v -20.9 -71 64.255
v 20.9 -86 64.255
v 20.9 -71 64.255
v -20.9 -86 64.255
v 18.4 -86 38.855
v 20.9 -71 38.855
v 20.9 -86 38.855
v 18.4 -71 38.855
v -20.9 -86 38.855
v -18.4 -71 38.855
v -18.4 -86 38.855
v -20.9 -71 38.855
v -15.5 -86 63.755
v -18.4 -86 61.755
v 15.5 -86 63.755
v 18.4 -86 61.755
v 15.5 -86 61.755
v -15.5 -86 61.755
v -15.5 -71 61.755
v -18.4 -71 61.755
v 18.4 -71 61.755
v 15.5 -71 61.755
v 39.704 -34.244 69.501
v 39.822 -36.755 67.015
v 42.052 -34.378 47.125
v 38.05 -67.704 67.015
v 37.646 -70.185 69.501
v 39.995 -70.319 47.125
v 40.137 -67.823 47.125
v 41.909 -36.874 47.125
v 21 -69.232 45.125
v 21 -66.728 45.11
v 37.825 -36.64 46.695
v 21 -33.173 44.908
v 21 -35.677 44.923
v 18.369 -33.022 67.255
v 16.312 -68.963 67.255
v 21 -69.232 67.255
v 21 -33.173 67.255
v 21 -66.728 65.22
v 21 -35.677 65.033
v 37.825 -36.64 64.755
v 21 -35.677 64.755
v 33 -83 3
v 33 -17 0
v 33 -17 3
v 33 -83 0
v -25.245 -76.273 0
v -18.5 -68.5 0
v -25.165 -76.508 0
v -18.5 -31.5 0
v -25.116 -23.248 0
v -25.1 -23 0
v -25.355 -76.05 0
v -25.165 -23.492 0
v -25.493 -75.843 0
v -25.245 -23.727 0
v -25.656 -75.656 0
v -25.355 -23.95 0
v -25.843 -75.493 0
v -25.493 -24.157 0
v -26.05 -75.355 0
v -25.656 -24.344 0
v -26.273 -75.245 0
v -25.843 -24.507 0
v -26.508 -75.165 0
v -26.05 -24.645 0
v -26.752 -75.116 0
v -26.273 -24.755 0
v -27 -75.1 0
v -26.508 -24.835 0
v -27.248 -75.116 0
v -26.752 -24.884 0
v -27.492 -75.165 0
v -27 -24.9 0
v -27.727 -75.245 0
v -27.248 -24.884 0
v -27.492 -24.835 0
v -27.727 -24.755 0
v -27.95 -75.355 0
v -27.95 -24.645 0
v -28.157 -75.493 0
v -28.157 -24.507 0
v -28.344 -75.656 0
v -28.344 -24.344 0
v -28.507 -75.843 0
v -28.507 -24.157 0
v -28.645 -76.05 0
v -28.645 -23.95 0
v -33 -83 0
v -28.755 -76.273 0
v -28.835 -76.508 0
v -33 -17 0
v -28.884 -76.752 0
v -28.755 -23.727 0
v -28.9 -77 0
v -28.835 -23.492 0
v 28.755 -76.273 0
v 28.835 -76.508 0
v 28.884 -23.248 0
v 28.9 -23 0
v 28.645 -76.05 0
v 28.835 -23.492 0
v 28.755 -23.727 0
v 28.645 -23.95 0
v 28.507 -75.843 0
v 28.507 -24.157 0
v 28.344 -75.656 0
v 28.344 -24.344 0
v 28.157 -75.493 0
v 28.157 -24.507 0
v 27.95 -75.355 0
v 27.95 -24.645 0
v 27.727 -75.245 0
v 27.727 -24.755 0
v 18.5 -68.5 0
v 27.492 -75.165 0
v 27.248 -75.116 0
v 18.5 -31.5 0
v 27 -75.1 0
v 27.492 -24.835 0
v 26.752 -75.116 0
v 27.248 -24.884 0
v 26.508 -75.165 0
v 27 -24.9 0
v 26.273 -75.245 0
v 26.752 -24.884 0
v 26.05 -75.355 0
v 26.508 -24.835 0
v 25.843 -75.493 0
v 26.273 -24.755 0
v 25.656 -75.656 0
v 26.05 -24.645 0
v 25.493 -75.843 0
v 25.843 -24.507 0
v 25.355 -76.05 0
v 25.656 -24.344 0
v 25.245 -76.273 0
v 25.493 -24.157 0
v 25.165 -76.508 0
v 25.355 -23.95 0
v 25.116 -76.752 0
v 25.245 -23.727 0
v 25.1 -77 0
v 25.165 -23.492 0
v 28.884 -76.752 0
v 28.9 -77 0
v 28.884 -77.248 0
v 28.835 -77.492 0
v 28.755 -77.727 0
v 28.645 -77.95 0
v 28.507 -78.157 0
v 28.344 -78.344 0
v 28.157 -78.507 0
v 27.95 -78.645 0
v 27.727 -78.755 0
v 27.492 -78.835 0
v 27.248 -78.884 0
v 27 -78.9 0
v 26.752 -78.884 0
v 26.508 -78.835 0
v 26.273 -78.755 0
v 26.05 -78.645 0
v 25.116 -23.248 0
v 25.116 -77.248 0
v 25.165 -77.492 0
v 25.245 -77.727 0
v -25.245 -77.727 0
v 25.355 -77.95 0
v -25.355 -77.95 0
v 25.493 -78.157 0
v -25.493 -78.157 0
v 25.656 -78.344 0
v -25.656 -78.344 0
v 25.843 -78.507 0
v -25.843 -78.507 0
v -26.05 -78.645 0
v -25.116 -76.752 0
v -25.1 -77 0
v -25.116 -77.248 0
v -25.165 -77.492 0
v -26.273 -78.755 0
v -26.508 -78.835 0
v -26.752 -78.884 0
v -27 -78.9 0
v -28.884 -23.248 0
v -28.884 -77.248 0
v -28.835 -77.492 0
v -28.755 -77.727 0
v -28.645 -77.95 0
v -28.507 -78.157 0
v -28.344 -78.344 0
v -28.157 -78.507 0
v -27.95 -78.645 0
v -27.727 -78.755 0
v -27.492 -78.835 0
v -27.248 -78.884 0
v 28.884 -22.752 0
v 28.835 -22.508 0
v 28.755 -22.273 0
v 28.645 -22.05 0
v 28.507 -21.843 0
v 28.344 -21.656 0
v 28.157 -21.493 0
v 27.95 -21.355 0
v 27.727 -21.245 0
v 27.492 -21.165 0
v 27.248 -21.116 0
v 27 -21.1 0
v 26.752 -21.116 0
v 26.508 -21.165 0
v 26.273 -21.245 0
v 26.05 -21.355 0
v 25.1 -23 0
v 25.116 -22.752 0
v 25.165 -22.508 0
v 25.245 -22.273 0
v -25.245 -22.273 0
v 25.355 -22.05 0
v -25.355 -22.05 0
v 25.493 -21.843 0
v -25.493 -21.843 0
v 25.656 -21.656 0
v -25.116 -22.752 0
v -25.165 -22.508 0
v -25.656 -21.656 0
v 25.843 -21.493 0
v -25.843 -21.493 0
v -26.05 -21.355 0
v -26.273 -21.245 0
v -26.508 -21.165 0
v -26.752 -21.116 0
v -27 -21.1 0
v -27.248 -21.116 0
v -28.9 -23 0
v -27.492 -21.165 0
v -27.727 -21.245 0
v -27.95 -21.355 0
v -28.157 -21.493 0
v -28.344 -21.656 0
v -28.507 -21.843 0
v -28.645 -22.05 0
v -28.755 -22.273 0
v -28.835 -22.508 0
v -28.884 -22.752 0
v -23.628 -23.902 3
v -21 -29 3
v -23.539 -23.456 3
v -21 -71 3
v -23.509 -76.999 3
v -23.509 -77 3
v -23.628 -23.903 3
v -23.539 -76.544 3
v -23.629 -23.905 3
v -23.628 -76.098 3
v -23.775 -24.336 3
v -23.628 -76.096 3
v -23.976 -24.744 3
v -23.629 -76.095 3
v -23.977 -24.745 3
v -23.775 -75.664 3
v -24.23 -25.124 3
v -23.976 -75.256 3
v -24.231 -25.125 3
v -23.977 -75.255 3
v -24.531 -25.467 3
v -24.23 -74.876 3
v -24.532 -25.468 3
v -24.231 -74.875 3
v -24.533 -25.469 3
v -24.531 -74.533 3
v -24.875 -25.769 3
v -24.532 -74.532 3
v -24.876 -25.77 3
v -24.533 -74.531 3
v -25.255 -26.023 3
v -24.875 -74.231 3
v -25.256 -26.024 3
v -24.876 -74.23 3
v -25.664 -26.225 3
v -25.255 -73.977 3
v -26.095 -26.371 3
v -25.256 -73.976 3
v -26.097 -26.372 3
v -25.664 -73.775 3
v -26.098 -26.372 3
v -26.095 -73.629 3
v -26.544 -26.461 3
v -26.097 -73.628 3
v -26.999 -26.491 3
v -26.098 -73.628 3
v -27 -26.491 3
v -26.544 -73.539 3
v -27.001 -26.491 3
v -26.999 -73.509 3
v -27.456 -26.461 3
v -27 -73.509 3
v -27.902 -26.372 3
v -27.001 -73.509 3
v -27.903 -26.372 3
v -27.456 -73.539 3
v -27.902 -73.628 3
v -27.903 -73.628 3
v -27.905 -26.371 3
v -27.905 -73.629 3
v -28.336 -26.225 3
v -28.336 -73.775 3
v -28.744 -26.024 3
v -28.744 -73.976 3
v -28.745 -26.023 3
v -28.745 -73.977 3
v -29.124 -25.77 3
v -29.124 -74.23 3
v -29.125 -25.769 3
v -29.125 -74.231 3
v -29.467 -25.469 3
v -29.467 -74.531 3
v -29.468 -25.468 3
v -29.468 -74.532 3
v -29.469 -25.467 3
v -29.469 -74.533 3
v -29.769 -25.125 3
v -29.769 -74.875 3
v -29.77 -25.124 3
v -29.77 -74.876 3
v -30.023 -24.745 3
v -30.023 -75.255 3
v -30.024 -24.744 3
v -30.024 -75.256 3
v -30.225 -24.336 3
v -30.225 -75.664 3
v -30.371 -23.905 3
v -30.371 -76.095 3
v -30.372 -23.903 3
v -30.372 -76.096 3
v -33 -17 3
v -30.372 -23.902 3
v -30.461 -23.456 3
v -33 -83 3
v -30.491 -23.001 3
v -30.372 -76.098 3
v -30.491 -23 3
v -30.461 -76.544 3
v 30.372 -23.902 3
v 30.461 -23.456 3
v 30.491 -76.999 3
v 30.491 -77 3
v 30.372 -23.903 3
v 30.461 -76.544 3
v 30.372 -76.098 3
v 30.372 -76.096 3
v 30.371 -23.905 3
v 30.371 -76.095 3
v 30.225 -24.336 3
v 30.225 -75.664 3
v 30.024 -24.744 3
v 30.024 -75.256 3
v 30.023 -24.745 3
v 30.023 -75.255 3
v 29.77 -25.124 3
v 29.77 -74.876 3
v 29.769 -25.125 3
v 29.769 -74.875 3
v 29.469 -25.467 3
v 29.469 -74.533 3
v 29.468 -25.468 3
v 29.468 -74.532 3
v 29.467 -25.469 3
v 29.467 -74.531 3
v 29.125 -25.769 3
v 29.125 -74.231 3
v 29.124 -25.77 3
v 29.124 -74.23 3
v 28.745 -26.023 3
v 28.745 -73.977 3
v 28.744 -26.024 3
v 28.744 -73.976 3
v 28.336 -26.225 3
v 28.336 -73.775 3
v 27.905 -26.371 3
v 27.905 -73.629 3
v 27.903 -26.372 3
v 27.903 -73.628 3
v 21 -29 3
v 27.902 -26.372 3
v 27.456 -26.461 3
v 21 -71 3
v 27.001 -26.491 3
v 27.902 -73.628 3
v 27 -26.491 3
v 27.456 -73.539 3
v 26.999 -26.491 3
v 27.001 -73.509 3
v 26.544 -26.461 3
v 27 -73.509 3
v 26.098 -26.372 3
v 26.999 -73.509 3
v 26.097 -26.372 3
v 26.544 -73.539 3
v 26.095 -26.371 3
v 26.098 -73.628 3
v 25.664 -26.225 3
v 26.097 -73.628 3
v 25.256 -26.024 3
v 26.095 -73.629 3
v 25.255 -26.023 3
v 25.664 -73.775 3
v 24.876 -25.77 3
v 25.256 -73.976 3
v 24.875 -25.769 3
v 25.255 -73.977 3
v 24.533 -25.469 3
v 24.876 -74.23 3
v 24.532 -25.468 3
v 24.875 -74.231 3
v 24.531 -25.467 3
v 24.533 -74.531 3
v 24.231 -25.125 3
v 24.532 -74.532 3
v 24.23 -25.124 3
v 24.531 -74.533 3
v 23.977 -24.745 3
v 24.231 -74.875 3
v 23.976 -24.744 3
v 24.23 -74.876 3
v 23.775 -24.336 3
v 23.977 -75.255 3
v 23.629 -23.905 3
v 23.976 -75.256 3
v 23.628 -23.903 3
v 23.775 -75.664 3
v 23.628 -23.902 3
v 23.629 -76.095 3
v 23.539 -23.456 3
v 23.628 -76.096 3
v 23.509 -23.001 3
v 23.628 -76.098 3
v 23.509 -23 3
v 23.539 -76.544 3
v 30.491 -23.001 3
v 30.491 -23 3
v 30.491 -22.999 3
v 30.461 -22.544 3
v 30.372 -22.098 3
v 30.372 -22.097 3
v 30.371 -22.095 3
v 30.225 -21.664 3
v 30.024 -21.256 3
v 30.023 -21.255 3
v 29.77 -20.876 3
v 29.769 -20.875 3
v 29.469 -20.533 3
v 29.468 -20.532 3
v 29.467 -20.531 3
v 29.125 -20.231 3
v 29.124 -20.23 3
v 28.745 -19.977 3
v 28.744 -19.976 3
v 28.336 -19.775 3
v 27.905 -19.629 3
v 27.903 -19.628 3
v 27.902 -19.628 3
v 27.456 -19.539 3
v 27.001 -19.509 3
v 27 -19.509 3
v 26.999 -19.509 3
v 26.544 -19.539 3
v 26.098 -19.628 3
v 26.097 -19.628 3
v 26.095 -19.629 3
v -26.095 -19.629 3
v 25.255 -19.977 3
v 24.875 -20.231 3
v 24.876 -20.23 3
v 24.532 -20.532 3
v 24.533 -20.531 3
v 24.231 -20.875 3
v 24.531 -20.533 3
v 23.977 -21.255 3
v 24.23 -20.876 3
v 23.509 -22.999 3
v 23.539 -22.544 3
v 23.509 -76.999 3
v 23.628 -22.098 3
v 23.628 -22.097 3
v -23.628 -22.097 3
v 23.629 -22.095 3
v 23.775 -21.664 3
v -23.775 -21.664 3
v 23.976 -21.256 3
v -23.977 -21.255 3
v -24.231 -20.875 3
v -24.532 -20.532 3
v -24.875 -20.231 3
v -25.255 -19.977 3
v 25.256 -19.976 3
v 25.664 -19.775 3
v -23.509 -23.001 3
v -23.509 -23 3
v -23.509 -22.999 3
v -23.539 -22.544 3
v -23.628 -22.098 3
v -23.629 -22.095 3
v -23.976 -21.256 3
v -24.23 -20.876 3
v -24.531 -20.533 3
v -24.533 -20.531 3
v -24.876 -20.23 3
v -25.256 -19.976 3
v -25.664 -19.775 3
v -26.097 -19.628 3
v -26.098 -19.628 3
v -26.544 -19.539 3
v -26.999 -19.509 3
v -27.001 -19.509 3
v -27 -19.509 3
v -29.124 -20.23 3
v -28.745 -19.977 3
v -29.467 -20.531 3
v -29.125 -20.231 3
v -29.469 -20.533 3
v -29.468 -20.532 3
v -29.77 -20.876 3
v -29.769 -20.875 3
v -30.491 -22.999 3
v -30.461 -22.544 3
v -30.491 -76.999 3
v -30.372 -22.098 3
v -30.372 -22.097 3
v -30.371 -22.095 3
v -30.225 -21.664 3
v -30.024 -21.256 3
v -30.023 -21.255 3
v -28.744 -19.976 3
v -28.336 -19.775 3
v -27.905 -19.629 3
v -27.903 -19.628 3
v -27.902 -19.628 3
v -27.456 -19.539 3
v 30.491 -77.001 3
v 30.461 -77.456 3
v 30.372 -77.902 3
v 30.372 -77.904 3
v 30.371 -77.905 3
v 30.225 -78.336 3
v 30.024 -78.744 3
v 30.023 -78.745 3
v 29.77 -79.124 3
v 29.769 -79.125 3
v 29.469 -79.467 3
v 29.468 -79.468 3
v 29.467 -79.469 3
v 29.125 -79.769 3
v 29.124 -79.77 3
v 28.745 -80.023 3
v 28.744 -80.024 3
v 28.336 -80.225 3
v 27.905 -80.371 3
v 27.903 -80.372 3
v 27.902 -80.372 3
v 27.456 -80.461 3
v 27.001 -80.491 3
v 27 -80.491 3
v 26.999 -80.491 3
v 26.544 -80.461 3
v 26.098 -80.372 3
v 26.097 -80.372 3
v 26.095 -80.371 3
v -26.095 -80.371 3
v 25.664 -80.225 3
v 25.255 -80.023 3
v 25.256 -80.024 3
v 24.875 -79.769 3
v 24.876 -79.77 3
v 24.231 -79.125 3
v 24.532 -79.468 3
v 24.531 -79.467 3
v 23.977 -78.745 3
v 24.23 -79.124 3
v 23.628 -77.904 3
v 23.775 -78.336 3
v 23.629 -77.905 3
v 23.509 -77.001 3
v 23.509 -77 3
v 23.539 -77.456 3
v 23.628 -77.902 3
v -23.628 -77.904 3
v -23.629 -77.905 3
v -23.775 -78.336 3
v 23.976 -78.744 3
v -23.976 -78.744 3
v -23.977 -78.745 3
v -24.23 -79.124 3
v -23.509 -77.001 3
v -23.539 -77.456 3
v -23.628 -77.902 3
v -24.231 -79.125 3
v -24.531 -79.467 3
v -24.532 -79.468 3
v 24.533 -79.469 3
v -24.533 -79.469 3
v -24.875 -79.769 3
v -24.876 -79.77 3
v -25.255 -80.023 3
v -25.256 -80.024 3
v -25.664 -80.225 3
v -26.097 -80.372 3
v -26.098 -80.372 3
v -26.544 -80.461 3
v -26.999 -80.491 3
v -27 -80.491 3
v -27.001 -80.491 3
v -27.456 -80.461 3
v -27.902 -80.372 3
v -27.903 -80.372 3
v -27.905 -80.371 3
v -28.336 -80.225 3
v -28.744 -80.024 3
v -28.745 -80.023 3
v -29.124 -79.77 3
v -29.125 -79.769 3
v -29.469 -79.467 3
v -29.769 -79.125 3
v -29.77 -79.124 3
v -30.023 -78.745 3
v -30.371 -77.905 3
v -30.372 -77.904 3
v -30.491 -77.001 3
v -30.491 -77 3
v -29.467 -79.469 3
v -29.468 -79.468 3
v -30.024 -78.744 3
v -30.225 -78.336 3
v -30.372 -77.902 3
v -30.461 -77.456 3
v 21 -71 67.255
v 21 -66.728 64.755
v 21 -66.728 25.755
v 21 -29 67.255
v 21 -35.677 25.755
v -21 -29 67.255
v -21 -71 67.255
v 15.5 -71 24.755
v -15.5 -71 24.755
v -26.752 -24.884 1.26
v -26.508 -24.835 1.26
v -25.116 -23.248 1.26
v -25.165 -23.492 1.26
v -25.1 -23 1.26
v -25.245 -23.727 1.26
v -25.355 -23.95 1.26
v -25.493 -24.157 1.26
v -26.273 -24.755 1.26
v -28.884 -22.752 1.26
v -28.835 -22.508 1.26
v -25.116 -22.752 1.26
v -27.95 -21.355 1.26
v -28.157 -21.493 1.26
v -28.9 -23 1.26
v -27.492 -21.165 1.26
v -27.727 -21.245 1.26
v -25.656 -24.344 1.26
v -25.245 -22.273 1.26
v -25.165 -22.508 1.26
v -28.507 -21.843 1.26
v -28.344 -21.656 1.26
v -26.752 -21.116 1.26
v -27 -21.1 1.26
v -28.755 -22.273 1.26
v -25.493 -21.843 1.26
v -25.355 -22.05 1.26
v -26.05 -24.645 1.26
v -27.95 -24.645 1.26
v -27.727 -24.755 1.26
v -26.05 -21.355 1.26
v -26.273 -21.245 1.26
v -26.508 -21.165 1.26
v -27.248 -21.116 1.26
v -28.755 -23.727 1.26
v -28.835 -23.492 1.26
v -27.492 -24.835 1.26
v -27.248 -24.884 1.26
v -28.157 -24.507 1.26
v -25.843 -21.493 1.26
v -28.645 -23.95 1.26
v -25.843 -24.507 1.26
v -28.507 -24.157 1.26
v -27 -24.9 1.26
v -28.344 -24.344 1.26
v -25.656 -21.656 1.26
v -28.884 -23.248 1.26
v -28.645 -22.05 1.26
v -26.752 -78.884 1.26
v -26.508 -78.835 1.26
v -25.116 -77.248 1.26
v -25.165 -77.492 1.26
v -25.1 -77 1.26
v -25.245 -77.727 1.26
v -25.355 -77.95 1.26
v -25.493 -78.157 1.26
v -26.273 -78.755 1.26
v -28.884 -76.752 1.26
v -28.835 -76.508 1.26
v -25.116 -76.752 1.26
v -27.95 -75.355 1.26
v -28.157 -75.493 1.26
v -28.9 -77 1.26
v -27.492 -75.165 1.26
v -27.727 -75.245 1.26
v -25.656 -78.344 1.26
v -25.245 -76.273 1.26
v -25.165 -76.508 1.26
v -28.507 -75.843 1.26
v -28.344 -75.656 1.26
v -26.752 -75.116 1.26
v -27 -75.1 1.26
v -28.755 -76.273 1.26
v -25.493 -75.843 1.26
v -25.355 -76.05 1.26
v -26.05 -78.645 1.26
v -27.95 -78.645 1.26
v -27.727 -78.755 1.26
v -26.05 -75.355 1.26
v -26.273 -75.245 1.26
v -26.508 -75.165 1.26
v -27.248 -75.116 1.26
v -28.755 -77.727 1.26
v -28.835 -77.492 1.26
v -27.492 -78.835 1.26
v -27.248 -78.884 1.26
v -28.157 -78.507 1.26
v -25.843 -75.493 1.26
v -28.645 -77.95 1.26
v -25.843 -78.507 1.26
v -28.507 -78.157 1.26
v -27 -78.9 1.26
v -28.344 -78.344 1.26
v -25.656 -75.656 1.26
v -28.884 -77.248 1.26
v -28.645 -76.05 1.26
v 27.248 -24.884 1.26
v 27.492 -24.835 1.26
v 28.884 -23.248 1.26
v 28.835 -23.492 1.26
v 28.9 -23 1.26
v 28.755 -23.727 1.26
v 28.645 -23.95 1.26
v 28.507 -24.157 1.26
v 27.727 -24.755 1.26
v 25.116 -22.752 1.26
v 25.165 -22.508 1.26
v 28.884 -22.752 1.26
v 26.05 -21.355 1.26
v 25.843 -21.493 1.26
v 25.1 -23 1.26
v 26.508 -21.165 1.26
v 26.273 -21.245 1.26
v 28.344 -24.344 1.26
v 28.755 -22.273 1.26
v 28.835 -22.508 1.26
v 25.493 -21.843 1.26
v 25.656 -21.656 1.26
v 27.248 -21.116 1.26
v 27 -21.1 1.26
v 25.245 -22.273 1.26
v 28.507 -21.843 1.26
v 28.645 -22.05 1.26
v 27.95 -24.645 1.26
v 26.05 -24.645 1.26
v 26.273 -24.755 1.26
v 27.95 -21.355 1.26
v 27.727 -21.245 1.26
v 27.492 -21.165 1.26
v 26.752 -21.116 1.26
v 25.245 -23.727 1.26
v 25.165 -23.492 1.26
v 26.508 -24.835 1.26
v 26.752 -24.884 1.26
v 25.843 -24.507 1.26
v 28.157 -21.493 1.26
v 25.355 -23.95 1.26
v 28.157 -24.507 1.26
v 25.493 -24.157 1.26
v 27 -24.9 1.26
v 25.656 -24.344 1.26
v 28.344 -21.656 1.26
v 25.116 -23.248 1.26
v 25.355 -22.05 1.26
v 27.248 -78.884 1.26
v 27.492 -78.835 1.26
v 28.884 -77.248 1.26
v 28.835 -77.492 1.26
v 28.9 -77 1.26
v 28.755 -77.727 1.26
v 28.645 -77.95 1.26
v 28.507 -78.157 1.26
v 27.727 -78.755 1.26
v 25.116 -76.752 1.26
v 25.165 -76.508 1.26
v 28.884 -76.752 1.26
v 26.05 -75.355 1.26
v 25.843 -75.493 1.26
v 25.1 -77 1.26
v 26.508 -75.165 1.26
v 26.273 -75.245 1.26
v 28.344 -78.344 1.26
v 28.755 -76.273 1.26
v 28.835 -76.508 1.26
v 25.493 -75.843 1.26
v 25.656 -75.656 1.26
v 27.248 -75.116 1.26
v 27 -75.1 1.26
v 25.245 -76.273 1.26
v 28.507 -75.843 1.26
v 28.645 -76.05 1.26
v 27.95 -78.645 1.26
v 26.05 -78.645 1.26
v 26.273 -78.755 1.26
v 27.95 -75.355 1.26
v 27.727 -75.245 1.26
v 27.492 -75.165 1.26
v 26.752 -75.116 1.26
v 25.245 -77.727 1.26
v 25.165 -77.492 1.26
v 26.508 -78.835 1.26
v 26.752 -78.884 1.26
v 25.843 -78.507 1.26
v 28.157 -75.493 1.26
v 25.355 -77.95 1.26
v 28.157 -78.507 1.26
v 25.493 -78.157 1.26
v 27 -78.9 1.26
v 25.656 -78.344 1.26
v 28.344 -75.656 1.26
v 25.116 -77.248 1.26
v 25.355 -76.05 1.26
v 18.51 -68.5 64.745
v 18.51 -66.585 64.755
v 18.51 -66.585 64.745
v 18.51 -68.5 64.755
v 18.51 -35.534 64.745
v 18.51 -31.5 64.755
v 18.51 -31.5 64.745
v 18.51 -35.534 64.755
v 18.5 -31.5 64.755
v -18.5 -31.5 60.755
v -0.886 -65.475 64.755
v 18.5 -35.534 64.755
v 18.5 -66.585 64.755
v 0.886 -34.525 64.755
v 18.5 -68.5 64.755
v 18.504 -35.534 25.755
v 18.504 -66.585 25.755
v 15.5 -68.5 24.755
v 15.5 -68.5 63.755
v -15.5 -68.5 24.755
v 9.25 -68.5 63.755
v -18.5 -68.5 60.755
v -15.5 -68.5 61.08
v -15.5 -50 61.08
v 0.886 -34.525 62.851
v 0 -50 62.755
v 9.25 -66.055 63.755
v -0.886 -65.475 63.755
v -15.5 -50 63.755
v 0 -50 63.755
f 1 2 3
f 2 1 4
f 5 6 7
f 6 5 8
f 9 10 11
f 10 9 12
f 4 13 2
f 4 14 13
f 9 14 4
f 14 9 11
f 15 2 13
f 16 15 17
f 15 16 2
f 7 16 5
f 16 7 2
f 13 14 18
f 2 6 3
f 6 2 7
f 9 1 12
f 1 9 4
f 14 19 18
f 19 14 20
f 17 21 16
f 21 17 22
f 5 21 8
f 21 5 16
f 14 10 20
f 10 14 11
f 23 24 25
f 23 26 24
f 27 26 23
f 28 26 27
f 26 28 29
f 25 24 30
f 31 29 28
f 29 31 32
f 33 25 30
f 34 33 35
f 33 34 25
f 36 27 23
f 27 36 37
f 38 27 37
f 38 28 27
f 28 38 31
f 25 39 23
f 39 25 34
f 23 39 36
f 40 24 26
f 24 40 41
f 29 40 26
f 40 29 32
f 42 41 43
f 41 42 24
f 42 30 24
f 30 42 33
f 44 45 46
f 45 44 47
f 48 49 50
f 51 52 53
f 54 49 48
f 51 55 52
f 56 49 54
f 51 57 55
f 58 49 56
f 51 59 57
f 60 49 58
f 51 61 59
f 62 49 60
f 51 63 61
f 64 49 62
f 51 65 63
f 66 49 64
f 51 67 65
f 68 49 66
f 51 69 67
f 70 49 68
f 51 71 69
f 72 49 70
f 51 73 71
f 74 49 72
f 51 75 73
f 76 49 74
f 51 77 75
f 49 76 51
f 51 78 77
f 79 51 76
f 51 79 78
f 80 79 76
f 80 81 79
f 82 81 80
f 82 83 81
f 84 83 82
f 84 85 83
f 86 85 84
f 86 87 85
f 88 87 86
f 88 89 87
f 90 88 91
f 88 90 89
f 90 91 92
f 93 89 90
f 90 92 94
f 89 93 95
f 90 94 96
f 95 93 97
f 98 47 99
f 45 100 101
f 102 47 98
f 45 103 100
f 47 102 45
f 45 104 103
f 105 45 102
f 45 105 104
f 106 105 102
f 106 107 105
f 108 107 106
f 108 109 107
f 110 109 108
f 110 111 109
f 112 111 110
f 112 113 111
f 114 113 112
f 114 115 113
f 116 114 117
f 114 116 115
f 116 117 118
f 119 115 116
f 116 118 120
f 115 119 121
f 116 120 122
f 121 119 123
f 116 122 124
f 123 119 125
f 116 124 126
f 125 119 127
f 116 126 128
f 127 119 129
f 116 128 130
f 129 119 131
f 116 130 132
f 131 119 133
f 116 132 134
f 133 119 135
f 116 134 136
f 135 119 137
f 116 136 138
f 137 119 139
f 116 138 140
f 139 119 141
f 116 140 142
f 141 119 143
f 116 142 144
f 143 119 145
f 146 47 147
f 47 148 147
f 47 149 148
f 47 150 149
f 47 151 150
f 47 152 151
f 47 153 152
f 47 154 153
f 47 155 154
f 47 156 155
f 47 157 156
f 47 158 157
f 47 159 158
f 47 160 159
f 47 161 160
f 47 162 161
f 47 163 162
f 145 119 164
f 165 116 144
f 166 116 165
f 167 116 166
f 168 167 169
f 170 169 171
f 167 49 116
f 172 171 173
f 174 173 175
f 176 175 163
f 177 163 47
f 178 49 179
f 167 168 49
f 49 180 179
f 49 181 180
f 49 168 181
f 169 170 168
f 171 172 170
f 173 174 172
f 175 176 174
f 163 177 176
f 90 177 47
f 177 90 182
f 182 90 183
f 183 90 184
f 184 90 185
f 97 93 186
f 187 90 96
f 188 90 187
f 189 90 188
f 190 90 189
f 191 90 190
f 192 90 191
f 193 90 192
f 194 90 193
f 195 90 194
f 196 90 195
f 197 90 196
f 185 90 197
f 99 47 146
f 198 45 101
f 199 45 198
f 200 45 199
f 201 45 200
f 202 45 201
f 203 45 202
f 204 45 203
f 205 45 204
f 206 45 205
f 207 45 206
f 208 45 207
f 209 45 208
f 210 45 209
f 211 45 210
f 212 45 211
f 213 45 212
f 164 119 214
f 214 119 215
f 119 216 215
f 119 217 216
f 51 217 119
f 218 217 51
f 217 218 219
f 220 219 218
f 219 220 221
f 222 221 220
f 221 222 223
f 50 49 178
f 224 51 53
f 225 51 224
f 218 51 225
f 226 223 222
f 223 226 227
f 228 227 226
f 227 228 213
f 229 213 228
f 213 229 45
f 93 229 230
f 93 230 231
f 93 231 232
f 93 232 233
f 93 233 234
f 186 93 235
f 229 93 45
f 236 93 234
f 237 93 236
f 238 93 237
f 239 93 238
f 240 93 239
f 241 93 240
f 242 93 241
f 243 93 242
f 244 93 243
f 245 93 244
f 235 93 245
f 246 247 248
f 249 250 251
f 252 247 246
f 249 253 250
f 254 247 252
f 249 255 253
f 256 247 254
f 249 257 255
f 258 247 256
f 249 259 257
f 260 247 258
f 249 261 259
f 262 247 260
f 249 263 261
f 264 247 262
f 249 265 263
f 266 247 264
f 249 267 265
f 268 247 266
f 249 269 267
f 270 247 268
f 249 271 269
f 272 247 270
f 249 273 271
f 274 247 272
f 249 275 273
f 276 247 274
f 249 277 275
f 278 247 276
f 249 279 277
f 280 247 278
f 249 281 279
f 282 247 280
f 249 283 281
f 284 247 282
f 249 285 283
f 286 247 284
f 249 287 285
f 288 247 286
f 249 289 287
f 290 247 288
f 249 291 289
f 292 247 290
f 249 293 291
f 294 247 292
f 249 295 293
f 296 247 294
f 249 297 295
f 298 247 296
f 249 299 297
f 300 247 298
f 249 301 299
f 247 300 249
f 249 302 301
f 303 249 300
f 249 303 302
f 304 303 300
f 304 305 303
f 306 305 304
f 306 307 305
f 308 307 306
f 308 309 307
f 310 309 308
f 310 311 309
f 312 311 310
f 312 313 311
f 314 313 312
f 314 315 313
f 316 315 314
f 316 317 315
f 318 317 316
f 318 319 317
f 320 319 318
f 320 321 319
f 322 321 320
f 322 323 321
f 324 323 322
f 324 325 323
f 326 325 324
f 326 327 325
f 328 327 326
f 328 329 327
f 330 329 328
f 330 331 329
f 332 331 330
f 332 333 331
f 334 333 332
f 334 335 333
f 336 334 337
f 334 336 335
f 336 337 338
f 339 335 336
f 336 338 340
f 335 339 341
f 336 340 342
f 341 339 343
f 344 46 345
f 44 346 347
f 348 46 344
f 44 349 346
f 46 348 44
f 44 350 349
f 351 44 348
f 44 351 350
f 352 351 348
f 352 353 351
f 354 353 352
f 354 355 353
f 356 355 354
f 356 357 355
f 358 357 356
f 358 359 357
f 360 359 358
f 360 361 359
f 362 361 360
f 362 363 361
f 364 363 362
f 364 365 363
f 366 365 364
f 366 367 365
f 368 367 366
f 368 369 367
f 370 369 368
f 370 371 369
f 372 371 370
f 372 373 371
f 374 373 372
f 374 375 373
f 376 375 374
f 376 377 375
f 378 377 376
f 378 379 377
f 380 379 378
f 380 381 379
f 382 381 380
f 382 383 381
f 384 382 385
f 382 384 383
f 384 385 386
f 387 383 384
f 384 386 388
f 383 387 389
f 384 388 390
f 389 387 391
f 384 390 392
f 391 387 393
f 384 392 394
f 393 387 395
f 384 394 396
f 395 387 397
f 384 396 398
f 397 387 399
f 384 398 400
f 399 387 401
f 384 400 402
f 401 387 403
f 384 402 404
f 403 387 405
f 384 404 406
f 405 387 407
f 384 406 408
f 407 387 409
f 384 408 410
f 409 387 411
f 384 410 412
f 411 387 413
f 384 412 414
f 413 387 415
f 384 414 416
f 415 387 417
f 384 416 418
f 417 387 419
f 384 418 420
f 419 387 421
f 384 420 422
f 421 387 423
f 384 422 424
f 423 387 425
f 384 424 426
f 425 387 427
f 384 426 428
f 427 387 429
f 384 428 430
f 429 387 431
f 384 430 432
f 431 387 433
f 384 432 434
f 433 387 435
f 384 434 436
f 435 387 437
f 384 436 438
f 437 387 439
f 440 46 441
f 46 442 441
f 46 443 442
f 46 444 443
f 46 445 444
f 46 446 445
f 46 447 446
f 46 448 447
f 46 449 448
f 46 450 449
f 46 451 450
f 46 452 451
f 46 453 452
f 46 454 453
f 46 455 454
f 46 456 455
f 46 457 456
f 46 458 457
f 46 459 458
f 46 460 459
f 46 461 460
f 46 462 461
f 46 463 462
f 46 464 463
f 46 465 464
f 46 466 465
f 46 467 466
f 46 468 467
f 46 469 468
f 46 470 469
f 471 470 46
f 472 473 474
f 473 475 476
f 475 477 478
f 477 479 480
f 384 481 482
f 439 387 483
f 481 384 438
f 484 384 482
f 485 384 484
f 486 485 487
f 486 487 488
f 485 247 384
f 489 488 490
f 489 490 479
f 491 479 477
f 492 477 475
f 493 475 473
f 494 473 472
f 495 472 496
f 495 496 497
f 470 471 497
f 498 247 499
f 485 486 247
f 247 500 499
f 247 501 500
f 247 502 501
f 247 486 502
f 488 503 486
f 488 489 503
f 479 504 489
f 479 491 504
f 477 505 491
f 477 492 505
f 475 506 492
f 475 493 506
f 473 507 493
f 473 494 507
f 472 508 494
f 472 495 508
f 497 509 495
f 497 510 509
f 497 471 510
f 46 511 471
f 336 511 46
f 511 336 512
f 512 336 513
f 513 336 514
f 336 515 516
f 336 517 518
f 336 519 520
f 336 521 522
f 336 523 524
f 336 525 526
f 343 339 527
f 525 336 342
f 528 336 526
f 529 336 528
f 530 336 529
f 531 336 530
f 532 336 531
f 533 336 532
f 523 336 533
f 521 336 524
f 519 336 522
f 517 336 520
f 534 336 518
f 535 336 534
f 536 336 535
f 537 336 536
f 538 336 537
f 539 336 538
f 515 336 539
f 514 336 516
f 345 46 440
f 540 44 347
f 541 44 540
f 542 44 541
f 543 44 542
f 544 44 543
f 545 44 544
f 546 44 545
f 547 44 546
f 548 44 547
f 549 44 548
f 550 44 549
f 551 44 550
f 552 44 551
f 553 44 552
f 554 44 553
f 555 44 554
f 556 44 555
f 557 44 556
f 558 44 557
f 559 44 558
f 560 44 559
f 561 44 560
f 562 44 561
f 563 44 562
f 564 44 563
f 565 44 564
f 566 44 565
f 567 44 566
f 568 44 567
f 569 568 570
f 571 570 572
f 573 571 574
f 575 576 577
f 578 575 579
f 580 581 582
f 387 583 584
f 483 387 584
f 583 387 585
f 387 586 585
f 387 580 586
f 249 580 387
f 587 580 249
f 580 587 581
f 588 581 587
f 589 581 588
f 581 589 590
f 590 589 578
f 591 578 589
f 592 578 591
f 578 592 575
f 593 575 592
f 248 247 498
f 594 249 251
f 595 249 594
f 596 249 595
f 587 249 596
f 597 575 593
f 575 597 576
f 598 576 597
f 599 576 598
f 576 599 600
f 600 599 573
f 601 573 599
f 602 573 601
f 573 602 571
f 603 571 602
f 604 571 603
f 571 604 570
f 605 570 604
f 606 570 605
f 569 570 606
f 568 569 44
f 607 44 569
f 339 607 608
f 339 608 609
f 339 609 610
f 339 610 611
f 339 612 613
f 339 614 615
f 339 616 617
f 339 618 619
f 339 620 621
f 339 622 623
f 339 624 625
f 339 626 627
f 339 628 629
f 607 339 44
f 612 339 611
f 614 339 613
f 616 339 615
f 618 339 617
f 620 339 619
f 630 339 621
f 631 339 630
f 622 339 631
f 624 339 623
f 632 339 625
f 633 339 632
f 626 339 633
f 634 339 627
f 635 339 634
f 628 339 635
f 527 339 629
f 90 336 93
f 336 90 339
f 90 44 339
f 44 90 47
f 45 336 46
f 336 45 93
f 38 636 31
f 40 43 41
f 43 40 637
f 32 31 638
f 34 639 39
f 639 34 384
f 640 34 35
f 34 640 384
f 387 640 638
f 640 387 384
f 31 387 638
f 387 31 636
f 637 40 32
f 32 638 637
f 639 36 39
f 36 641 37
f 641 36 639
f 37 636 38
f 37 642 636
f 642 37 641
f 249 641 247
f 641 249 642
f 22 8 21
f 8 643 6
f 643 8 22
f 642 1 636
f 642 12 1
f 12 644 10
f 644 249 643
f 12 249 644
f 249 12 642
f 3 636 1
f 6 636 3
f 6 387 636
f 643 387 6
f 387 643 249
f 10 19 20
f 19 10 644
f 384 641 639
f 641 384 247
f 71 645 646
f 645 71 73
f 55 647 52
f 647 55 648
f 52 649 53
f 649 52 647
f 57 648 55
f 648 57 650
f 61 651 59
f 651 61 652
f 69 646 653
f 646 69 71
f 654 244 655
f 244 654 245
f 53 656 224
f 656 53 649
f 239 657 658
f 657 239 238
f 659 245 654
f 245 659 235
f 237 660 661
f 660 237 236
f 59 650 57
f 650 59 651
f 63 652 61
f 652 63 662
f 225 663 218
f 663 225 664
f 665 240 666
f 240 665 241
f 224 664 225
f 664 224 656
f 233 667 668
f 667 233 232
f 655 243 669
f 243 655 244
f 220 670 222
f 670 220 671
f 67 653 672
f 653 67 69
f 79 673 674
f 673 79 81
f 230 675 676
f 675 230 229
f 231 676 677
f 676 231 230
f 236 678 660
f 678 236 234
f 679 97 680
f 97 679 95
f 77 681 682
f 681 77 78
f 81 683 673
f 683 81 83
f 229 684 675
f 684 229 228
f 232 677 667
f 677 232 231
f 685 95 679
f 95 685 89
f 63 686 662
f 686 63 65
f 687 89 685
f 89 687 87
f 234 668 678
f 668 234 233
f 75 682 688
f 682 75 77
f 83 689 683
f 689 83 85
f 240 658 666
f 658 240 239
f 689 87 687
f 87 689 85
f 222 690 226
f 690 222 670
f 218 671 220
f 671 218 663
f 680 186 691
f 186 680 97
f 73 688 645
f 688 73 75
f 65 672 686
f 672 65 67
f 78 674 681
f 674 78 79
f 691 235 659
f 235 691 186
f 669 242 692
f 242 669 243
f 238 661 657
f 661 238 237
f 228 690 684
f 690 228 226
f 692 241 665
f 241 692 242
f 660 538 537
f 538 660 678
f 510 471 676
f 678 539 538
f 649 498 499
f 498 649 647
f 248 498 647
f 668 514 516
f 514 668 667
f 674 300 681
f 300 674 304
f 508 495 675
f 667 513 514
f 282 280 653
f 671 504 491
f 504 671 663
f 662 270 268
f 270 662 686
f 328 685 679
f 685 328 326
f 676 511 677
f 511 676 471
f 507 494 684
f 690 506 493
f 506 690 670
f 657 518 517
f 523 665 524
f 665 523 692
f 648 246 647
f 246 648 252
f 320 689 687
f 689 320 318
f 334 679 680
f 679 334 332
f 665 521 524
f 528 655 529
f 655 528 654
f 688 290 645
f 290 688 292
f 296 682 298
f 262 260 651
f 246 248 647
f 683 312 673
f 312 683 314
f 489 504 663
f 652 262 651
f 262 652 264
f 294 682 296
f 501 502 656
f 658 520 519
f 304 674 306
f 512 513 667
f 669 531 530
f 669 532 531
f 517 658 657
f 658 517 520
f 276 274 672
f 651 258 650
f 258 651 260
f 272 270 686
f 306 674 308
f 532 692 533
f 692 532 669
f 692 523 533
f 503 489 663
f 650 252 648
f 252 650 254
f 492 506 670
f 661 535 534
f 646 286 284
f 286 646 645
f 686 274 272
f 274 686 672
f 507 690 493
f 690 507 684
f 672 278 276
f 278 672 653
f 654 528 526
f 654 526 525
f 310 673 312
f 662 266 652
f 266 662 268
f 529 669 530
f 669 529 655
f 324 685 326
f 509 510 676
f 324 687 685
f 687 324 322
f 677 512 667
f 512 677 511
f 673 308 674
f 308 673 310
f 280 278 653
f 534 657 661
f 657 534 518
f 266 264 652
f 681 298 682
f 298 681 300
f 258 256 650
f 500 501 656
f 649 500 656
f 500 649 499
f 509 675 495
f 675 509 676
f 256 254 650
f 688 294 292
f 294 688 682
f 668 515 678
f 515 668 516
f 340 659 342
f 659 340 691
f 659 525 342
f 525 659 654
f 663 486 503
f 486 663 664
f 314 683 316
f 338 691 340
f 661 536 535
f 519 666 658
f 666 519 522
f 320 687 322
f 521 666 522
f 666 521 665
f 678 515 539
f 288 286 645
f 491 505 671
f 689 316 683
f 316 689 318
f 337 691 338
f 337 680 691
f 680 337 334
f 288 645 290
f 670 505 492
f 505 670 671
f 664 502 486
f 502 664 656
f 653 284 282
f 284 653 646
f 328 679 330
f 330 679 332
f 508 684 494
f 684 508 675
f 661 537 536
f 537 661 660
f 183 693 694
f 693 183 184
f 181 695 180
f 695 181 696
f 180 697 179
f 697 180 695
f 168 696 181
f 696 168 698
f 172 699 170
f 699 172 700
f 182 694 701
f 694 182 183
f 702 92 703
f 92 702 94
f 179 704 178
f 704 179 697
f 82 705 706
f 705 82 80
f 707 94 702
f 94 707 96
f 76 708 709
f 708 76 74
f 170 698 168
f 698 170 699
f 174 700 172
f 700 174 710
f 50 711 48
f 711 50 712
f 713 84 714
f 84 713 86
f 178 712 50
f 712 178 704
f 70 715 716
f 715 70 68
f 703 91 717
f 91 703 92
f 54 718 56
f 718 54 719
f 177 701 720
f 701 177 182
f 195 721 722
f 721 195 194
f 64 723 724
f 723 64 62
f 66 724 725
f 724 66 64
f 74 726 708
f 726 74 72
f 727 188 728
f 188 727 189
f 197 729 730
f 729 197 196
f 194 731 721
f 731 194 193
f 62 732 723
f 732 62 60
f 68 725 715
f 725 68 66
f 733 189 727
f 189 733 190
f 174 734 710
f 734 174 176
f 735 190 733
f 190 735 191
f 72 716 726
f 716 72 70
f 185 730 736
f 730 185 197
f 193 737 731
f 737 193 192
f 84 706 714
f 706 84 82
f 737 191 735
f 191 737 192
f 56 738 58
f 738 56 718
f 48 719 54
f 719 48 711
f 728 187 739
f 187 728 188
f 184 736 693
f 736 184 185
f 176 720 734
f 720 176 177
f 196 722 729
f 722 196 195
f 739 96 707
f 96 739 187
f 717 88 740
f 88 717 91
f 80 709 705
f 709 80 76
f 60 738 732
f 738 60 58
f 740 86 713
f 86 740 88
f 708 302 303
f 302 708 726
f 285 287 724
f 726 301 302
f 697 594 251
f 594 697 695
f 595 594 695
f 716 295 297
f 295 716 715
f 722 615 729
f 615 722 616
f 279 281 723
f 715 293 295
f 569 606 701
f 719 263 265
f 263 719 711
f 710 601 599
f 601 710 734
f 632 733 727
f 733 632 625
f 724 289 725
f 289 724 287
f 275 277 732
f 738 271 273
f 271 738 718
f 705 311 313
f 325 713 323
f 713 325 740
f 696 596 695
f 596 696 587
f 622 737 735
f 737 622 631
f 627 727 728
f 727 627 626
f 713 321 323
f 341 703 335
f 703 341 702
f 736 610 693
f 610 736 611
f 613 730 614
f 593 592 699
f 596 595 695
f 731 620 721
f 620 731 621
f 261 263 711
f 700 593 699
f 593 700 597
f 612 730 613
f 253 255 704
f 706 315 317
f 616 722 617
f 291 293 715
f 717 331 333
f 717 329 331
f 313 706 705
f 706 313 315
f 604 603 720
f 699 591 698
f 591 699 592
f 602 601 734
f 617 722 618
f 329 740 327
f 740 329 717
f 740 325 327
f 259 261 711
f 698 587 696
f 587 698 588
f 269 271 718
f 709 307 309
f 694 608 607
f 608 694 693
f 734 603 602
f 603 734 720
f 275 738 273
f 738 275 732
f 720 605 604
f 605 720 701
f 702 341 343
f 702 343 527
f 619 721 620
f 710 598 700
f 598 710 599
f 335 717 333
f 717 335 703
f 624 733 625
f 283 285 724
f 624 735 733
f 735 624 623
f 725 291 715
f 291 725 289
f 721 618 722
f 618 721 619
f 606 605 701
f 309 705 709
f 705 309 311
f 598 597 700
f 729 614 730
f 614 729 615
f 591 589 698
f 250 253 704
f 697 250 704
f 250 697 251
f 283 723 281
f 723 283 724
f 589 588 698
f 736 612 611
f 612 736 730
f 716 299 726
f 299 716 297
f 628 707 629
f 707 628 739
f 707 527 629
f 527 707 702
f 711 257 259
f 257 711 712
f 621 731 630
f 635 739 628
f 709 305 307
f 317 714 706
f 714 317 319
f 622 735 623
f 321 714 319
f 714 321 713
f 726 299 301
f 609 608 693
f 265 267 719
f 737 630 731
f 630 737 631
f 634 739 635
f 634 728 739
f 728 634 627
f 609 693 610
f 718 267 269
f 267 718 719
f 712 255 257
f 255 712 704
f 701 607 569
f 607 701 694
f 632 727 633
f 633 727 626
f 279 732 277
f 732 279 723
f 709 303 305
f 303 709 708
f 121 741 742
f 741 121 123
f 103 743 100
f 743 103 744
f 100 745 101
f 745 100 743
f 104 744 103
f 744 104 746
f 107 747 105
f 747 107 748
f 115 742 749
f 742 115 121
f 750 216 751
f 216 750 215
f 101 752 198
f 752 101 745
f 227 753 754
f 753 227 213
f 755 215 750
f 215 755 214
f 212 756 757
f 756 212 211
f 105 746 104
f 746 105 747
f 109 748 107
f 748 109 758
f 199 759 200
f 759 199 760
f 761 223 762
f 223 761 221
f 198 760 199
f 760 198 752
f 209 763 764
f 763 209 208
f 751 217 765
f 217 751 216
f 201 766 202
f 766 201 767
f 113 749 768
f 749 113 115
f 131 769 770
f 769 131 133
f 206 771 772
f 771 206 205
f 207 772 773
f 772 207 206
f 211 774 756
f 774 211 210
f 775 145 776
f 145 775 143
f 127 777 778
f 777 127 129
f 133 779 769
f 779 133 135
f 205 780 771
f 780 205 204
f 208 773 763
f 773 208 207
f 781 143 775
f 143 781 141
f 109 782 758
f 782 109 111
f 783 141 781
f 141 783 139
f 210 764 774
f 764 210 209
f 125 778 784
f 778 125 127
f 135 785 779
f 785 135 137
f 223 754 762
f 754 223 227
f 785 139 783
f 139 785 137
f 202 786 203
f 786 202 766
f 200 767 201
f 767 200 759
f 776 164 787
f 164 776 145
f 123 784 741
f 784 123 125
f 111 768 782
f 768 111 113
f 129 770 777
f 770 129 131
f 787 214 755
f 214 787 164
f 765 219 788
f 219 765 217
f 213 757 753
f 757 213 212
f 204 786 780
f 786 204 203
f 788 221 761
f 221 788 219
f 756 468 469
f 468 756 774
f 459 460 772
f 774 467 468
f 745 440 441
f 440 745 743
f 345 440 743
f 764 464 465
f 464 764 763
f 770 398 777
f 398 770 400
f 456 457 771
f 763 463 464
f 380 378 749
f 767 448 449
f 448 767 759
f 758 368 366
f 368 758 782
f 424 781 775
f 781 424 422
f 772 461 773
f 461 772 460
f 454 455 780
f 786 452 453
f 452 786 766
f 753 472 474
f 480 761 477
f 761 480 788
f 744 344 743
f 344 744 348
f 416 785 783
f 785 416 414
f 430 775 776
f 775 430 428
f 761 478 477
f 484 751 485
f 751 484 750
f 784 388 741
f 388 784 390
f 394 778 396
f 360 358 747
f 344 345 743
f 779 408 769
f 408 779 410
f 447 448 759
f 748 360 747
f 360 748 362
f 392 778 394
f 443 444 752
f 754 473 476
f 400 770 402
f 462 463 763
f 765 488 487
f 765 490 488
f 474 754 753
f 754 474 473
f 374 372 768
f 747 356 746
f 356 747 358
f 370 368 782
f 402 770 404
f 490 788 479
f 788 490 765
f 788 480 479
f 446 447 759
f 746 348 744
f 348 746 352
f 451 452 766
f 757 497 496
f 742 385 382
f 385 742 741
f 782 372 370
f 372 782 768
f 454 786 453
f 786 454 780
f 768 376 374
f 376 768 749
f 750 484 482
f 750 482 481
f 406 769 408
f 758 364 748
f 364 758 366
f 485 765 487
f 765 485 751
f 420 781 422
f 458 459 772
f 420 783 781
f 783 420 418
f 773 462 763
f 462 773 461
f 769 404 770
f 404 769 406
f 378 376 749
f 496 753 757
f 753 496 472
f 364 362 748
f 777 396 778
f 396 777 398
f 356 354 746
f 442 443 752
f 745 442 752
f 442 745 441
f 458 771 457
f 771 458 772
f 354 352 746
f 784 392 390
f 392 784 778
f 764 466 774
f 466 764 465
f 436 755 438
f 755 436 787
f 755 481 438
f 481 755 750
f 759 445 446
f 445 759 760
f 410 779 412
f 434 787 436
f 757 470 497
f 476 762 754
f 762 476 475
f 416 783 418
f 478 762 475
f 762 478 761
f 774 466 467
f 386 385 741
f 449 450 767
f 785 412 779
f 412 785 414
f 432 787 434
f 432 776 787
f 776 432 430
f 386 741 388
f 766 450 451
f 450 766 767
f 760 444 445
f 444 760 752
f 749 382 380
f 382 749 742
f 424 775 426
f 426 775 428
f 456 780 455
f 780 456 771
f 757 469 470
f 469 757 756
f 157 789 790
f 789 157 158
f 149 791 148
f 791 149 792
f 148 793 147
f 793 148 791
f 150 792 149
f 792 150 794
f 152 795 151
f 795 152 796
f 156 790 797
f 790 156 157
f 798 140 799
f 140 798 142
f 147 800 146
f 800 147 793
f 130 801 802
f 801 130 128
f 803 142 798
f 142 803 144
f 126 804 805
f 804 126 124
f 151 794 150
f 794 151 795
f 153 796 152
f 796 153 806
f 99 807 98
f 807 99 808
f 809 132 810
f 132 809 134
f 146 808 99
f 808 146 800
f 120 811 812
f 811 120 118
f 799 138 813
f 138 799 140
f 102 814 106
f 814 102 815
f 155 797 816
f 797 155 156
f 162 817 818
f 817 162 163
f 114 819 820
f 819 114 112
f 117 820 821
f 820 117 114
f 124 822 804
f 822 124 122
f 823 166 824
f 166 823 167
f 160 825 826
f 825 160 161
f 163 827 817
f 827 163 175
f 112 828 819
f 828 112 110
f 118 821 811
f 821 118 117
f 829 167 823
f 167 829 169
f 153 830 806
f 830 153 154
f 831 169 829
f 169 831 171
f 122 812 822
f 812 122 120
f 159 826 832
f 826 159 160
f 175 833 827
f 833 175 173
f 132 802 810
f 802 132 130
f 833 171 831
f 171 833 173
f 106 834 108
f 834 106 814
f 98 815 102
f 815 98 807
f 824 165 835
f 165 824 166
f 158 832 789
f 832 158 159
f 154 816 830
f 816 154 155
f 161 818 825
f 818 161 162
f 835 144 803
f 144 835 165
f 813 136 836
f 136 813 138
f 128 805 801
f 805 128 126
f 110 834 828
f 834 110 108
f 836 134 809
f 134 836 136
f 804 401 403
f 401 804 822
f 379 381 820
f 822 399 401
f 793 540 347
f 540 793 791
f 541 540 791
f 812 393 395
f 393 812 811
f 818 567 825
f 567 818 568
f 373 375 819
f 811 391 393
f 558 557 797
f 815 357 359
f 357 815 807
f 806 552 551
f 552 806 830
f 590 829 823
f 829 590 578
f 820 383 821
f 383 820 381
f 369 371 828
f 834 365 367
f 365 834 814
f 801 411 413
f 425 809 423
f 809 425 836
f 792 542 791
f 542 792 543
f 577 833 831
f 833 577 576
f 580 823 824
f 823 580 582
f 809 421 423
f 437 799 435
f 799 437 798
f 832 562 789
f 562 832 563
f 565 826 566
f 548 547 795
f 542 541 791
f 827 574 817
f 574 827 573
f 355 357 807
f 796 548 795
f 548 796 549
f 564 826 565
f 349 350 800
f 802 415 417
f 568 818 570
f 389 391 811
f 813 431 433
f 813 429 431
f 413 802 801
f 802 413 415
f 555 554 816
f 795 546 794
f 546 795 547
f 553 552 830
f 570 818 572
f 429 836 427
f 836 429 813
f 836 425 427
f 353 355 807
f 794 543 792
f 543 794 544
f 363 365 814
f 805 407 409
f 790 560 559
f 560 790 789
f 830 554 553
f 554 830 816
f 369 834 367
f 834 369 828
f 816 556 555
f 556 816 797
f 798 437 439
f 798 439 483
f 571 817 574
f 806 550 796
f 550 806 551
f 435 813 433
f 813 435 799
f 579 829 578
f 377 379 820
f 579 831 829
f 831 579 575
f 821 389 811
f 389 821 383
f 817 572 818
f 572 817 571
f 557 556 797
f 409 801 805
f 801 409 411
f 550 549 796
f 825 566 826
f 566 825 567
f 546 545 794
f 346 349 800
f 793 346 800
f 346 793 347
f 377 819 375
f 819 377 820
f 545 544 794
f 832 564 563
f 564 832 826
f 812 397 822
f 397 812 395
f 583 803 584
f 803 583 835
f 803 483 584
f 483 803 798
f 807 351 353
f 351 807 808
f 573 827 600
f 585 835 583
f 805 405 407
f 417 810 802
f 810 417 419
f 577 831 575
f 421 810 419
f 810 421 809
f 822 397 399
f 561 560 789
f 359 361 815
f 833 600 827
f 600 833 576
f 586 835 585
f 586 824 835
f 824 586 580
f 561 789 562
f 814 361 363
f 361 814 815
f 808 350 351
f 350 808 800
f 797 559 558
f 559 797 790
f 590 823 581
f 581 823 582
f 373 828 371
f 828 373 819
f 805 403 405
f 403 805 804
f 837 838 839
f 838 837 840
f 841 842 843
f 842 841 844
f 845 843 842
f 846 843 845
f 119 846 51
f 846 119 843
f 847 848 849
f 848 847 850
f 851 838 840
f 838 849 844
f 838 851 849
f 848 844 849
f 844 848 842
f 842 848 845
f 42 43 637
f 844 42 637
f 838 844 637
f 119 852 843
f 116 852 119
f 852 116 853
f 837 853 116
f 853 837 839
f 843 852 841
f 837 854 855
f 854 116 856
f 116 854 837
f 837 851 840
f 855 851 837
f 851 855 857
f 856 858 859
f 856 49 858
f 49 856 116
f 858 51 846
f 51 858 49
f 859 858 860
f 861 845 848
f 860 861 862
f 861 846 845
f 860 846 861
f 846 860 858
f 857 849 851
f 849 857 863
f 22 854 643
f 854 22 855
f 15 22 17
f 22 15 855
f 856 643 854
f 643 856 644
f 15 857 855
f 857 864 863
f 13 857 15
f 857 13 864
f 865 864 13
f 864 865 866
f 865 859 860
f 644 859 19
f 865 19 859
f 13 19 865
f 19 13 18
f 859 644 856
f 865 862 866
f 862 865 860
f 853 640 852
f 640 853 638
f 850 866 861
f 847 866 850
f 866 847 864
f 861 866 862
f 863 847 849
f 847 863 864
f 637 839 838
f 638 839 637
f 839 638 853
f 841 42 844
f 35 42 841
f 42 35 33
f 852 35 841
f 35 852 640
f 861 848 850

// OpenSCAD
// file: measurements.scad
// Measurements of YOUR table, shared by every printed part, in millimetres.
//
// These are placeholders until the real table is measured with calipers. Edit
// the numbers here (nothing else in this file), save, then open a part and
// export it. See docs/3d-printing.md.
//
// Positions are measured on the underside of the playfield, from its
// BOTTOM-LEFT corner (the corner nearest the player's left hand): x to the
// right, y up the table. The placeholders come from the playfield map and are
// only rough.

// --- The playfield ----------------------------------------------------------

// Thickness of the playfield at the trapdoor holes.
playfield_thickness = 12.7;

// --- The trapdoors ----------------------------------------------------------
// "Width" runs across the table (left to right); "length" runs up the table.

// Width of each trapdoor hole.
hole_width = 44;

// Length of each trapdoor hole.
hole_length = 48;

// Distance between the centres of neighbouring holes.
trapdoor_spacing = 50;

// Position of the CENTRE trapdoor hole's centre.
trapdoor_x = 240;
trapdoor_y = 614;

// --- The outhole ------------------------------------------------------------

// Position of the outhole's centre, and its diameter.
outhole_x = 240;
outhole_y = 25;
outhole_diameter = 32;

// --- The ball lift ----------------------------------------------------------

// Position of the hole in the shooter lane that the ball is lifted up through,
// and its diameter.
lift_hole_x = 502;
lift_hole_y = 40;
lift_hole_diameter = 30;

// The ball-serve (ball lift) coil assembly: the diameter of its plunger, and
// the distance between its two mounting screws.
lift_plunger_diameter = 12.7;
lift_coil_screw_spacing = 40;

// --- Screws and pins ---------------------------------------------------------

// Wood screws into the underside of the playfield. They must be SHORTER than
// the playfield is thick, or they'll come out through the artwork. 3.5 mm x
// 9.5 mm (No. 6 x 3/8") suits a 12.7 mm playfield.
wood_screw_diameter = 3.5;

// Steel rod used as each flap's hinge pin.
hinge_pin_diameter = 2;

// --- Printing ---------------------------------------------------------------

// Gap left between parts that fit together, for a typical printer. Make it
// bigger if parts are too tight, smaller if they're loose.
fit_clearance = 0.4;

// The longest part your printer (or printing service) can print. Long runs are
// split into segments no longer than this.
max_print_length = 170;
// main file
// Outhole funnel: screws under the outhole. Drained balls drop into it from
// above, and trapdoor balls arrive along the return run at the back; both roll
// out of its right side along the serve run to the ball lift.
//
// Print it upside down (the flange on the bed), with supports ("supports: on"
// in the slicer, or ask the printing service).

include <common.scad>

translate([-outhole_x, -outhole_y, 0]) rotate([180, 0, 0]) outhole_funnel();

module outhole_funnel() {
    plate = funnel_size + 2 * wall + 24;
    top = -3;
    difference() {
        union() {
            // The flange round the outhole.
            translate([outhole_x - plate / 2, outhole_y - plate / 2, top]) cube([plate, plate, 3]);
            // The box under it.
            translate([outhole_x - funnel_size / 2 - wall, outhole_y - funnel_size / 2 - wall, funnel_centre[2] - wall - 1])
                cube([funnel_size + 2 * wall, funnel_size + 2 * wall, top - funnel_centre[2] + wall + 1]);
            // Short stubs through the walls: in from the return run at the
            // back, out to the serve run on the right.
            channel(funnel_inlet + [0, wall, 0], funnel_inlet - [0, 1, 0], socket = true);
            channel(funnel_outlet, serve_start);
        }
        // Inside the box, its floor sloping down towards the outlet on the
        // right.
        hull() {
            translate([outhole_x - funnel_size / 2, outhole_y - funnel_size / 2, funnel_centre[2] + 3]) cube([0.01, funnel_size, 0.01]);
            translate([outhole_x + funnel_size / 2, outhole_y - funnel_size / 2, funnel_centre[2] - 1]) cube([0.01, funnel_size, 0.01]);
            translate([outhole_x - funnel_size / 2, outhole_y - funnel_size / 2, top + 0.01]) cube([funnel_size, funnel_size, 5]);
        }
        // The outhole above.
        translate([outhole_x, outhole_y, top - 1]) cylinder(d = outhole_diameter + 2, h = 5);
        // Openings to the inlet and outlet.
        // (Measured from the box's low floor, so taller than the ball.)
        translate([outhole_x - channel_inner / 2, outhole_y, funnel_centre[2]]) cube([channel_inner, funnel_size, doorway_height + 8]);
        translate([outhole_x, outhole_y, funnel_centre[2] - 1]) rotate([0, 0, serve_angle])
            translate([0, -channel_inner / 2, 0]) cube([funnel_size, channel_inner, doorway_height + 8]);
        for (x = [-1, 1], y = [-1, 1])
            translate([outhole_x + x * (plate / 2 - 6), outhole_y + y * (plate / 2 - 6), top]) wood_screw_hole(3);
    }
}
